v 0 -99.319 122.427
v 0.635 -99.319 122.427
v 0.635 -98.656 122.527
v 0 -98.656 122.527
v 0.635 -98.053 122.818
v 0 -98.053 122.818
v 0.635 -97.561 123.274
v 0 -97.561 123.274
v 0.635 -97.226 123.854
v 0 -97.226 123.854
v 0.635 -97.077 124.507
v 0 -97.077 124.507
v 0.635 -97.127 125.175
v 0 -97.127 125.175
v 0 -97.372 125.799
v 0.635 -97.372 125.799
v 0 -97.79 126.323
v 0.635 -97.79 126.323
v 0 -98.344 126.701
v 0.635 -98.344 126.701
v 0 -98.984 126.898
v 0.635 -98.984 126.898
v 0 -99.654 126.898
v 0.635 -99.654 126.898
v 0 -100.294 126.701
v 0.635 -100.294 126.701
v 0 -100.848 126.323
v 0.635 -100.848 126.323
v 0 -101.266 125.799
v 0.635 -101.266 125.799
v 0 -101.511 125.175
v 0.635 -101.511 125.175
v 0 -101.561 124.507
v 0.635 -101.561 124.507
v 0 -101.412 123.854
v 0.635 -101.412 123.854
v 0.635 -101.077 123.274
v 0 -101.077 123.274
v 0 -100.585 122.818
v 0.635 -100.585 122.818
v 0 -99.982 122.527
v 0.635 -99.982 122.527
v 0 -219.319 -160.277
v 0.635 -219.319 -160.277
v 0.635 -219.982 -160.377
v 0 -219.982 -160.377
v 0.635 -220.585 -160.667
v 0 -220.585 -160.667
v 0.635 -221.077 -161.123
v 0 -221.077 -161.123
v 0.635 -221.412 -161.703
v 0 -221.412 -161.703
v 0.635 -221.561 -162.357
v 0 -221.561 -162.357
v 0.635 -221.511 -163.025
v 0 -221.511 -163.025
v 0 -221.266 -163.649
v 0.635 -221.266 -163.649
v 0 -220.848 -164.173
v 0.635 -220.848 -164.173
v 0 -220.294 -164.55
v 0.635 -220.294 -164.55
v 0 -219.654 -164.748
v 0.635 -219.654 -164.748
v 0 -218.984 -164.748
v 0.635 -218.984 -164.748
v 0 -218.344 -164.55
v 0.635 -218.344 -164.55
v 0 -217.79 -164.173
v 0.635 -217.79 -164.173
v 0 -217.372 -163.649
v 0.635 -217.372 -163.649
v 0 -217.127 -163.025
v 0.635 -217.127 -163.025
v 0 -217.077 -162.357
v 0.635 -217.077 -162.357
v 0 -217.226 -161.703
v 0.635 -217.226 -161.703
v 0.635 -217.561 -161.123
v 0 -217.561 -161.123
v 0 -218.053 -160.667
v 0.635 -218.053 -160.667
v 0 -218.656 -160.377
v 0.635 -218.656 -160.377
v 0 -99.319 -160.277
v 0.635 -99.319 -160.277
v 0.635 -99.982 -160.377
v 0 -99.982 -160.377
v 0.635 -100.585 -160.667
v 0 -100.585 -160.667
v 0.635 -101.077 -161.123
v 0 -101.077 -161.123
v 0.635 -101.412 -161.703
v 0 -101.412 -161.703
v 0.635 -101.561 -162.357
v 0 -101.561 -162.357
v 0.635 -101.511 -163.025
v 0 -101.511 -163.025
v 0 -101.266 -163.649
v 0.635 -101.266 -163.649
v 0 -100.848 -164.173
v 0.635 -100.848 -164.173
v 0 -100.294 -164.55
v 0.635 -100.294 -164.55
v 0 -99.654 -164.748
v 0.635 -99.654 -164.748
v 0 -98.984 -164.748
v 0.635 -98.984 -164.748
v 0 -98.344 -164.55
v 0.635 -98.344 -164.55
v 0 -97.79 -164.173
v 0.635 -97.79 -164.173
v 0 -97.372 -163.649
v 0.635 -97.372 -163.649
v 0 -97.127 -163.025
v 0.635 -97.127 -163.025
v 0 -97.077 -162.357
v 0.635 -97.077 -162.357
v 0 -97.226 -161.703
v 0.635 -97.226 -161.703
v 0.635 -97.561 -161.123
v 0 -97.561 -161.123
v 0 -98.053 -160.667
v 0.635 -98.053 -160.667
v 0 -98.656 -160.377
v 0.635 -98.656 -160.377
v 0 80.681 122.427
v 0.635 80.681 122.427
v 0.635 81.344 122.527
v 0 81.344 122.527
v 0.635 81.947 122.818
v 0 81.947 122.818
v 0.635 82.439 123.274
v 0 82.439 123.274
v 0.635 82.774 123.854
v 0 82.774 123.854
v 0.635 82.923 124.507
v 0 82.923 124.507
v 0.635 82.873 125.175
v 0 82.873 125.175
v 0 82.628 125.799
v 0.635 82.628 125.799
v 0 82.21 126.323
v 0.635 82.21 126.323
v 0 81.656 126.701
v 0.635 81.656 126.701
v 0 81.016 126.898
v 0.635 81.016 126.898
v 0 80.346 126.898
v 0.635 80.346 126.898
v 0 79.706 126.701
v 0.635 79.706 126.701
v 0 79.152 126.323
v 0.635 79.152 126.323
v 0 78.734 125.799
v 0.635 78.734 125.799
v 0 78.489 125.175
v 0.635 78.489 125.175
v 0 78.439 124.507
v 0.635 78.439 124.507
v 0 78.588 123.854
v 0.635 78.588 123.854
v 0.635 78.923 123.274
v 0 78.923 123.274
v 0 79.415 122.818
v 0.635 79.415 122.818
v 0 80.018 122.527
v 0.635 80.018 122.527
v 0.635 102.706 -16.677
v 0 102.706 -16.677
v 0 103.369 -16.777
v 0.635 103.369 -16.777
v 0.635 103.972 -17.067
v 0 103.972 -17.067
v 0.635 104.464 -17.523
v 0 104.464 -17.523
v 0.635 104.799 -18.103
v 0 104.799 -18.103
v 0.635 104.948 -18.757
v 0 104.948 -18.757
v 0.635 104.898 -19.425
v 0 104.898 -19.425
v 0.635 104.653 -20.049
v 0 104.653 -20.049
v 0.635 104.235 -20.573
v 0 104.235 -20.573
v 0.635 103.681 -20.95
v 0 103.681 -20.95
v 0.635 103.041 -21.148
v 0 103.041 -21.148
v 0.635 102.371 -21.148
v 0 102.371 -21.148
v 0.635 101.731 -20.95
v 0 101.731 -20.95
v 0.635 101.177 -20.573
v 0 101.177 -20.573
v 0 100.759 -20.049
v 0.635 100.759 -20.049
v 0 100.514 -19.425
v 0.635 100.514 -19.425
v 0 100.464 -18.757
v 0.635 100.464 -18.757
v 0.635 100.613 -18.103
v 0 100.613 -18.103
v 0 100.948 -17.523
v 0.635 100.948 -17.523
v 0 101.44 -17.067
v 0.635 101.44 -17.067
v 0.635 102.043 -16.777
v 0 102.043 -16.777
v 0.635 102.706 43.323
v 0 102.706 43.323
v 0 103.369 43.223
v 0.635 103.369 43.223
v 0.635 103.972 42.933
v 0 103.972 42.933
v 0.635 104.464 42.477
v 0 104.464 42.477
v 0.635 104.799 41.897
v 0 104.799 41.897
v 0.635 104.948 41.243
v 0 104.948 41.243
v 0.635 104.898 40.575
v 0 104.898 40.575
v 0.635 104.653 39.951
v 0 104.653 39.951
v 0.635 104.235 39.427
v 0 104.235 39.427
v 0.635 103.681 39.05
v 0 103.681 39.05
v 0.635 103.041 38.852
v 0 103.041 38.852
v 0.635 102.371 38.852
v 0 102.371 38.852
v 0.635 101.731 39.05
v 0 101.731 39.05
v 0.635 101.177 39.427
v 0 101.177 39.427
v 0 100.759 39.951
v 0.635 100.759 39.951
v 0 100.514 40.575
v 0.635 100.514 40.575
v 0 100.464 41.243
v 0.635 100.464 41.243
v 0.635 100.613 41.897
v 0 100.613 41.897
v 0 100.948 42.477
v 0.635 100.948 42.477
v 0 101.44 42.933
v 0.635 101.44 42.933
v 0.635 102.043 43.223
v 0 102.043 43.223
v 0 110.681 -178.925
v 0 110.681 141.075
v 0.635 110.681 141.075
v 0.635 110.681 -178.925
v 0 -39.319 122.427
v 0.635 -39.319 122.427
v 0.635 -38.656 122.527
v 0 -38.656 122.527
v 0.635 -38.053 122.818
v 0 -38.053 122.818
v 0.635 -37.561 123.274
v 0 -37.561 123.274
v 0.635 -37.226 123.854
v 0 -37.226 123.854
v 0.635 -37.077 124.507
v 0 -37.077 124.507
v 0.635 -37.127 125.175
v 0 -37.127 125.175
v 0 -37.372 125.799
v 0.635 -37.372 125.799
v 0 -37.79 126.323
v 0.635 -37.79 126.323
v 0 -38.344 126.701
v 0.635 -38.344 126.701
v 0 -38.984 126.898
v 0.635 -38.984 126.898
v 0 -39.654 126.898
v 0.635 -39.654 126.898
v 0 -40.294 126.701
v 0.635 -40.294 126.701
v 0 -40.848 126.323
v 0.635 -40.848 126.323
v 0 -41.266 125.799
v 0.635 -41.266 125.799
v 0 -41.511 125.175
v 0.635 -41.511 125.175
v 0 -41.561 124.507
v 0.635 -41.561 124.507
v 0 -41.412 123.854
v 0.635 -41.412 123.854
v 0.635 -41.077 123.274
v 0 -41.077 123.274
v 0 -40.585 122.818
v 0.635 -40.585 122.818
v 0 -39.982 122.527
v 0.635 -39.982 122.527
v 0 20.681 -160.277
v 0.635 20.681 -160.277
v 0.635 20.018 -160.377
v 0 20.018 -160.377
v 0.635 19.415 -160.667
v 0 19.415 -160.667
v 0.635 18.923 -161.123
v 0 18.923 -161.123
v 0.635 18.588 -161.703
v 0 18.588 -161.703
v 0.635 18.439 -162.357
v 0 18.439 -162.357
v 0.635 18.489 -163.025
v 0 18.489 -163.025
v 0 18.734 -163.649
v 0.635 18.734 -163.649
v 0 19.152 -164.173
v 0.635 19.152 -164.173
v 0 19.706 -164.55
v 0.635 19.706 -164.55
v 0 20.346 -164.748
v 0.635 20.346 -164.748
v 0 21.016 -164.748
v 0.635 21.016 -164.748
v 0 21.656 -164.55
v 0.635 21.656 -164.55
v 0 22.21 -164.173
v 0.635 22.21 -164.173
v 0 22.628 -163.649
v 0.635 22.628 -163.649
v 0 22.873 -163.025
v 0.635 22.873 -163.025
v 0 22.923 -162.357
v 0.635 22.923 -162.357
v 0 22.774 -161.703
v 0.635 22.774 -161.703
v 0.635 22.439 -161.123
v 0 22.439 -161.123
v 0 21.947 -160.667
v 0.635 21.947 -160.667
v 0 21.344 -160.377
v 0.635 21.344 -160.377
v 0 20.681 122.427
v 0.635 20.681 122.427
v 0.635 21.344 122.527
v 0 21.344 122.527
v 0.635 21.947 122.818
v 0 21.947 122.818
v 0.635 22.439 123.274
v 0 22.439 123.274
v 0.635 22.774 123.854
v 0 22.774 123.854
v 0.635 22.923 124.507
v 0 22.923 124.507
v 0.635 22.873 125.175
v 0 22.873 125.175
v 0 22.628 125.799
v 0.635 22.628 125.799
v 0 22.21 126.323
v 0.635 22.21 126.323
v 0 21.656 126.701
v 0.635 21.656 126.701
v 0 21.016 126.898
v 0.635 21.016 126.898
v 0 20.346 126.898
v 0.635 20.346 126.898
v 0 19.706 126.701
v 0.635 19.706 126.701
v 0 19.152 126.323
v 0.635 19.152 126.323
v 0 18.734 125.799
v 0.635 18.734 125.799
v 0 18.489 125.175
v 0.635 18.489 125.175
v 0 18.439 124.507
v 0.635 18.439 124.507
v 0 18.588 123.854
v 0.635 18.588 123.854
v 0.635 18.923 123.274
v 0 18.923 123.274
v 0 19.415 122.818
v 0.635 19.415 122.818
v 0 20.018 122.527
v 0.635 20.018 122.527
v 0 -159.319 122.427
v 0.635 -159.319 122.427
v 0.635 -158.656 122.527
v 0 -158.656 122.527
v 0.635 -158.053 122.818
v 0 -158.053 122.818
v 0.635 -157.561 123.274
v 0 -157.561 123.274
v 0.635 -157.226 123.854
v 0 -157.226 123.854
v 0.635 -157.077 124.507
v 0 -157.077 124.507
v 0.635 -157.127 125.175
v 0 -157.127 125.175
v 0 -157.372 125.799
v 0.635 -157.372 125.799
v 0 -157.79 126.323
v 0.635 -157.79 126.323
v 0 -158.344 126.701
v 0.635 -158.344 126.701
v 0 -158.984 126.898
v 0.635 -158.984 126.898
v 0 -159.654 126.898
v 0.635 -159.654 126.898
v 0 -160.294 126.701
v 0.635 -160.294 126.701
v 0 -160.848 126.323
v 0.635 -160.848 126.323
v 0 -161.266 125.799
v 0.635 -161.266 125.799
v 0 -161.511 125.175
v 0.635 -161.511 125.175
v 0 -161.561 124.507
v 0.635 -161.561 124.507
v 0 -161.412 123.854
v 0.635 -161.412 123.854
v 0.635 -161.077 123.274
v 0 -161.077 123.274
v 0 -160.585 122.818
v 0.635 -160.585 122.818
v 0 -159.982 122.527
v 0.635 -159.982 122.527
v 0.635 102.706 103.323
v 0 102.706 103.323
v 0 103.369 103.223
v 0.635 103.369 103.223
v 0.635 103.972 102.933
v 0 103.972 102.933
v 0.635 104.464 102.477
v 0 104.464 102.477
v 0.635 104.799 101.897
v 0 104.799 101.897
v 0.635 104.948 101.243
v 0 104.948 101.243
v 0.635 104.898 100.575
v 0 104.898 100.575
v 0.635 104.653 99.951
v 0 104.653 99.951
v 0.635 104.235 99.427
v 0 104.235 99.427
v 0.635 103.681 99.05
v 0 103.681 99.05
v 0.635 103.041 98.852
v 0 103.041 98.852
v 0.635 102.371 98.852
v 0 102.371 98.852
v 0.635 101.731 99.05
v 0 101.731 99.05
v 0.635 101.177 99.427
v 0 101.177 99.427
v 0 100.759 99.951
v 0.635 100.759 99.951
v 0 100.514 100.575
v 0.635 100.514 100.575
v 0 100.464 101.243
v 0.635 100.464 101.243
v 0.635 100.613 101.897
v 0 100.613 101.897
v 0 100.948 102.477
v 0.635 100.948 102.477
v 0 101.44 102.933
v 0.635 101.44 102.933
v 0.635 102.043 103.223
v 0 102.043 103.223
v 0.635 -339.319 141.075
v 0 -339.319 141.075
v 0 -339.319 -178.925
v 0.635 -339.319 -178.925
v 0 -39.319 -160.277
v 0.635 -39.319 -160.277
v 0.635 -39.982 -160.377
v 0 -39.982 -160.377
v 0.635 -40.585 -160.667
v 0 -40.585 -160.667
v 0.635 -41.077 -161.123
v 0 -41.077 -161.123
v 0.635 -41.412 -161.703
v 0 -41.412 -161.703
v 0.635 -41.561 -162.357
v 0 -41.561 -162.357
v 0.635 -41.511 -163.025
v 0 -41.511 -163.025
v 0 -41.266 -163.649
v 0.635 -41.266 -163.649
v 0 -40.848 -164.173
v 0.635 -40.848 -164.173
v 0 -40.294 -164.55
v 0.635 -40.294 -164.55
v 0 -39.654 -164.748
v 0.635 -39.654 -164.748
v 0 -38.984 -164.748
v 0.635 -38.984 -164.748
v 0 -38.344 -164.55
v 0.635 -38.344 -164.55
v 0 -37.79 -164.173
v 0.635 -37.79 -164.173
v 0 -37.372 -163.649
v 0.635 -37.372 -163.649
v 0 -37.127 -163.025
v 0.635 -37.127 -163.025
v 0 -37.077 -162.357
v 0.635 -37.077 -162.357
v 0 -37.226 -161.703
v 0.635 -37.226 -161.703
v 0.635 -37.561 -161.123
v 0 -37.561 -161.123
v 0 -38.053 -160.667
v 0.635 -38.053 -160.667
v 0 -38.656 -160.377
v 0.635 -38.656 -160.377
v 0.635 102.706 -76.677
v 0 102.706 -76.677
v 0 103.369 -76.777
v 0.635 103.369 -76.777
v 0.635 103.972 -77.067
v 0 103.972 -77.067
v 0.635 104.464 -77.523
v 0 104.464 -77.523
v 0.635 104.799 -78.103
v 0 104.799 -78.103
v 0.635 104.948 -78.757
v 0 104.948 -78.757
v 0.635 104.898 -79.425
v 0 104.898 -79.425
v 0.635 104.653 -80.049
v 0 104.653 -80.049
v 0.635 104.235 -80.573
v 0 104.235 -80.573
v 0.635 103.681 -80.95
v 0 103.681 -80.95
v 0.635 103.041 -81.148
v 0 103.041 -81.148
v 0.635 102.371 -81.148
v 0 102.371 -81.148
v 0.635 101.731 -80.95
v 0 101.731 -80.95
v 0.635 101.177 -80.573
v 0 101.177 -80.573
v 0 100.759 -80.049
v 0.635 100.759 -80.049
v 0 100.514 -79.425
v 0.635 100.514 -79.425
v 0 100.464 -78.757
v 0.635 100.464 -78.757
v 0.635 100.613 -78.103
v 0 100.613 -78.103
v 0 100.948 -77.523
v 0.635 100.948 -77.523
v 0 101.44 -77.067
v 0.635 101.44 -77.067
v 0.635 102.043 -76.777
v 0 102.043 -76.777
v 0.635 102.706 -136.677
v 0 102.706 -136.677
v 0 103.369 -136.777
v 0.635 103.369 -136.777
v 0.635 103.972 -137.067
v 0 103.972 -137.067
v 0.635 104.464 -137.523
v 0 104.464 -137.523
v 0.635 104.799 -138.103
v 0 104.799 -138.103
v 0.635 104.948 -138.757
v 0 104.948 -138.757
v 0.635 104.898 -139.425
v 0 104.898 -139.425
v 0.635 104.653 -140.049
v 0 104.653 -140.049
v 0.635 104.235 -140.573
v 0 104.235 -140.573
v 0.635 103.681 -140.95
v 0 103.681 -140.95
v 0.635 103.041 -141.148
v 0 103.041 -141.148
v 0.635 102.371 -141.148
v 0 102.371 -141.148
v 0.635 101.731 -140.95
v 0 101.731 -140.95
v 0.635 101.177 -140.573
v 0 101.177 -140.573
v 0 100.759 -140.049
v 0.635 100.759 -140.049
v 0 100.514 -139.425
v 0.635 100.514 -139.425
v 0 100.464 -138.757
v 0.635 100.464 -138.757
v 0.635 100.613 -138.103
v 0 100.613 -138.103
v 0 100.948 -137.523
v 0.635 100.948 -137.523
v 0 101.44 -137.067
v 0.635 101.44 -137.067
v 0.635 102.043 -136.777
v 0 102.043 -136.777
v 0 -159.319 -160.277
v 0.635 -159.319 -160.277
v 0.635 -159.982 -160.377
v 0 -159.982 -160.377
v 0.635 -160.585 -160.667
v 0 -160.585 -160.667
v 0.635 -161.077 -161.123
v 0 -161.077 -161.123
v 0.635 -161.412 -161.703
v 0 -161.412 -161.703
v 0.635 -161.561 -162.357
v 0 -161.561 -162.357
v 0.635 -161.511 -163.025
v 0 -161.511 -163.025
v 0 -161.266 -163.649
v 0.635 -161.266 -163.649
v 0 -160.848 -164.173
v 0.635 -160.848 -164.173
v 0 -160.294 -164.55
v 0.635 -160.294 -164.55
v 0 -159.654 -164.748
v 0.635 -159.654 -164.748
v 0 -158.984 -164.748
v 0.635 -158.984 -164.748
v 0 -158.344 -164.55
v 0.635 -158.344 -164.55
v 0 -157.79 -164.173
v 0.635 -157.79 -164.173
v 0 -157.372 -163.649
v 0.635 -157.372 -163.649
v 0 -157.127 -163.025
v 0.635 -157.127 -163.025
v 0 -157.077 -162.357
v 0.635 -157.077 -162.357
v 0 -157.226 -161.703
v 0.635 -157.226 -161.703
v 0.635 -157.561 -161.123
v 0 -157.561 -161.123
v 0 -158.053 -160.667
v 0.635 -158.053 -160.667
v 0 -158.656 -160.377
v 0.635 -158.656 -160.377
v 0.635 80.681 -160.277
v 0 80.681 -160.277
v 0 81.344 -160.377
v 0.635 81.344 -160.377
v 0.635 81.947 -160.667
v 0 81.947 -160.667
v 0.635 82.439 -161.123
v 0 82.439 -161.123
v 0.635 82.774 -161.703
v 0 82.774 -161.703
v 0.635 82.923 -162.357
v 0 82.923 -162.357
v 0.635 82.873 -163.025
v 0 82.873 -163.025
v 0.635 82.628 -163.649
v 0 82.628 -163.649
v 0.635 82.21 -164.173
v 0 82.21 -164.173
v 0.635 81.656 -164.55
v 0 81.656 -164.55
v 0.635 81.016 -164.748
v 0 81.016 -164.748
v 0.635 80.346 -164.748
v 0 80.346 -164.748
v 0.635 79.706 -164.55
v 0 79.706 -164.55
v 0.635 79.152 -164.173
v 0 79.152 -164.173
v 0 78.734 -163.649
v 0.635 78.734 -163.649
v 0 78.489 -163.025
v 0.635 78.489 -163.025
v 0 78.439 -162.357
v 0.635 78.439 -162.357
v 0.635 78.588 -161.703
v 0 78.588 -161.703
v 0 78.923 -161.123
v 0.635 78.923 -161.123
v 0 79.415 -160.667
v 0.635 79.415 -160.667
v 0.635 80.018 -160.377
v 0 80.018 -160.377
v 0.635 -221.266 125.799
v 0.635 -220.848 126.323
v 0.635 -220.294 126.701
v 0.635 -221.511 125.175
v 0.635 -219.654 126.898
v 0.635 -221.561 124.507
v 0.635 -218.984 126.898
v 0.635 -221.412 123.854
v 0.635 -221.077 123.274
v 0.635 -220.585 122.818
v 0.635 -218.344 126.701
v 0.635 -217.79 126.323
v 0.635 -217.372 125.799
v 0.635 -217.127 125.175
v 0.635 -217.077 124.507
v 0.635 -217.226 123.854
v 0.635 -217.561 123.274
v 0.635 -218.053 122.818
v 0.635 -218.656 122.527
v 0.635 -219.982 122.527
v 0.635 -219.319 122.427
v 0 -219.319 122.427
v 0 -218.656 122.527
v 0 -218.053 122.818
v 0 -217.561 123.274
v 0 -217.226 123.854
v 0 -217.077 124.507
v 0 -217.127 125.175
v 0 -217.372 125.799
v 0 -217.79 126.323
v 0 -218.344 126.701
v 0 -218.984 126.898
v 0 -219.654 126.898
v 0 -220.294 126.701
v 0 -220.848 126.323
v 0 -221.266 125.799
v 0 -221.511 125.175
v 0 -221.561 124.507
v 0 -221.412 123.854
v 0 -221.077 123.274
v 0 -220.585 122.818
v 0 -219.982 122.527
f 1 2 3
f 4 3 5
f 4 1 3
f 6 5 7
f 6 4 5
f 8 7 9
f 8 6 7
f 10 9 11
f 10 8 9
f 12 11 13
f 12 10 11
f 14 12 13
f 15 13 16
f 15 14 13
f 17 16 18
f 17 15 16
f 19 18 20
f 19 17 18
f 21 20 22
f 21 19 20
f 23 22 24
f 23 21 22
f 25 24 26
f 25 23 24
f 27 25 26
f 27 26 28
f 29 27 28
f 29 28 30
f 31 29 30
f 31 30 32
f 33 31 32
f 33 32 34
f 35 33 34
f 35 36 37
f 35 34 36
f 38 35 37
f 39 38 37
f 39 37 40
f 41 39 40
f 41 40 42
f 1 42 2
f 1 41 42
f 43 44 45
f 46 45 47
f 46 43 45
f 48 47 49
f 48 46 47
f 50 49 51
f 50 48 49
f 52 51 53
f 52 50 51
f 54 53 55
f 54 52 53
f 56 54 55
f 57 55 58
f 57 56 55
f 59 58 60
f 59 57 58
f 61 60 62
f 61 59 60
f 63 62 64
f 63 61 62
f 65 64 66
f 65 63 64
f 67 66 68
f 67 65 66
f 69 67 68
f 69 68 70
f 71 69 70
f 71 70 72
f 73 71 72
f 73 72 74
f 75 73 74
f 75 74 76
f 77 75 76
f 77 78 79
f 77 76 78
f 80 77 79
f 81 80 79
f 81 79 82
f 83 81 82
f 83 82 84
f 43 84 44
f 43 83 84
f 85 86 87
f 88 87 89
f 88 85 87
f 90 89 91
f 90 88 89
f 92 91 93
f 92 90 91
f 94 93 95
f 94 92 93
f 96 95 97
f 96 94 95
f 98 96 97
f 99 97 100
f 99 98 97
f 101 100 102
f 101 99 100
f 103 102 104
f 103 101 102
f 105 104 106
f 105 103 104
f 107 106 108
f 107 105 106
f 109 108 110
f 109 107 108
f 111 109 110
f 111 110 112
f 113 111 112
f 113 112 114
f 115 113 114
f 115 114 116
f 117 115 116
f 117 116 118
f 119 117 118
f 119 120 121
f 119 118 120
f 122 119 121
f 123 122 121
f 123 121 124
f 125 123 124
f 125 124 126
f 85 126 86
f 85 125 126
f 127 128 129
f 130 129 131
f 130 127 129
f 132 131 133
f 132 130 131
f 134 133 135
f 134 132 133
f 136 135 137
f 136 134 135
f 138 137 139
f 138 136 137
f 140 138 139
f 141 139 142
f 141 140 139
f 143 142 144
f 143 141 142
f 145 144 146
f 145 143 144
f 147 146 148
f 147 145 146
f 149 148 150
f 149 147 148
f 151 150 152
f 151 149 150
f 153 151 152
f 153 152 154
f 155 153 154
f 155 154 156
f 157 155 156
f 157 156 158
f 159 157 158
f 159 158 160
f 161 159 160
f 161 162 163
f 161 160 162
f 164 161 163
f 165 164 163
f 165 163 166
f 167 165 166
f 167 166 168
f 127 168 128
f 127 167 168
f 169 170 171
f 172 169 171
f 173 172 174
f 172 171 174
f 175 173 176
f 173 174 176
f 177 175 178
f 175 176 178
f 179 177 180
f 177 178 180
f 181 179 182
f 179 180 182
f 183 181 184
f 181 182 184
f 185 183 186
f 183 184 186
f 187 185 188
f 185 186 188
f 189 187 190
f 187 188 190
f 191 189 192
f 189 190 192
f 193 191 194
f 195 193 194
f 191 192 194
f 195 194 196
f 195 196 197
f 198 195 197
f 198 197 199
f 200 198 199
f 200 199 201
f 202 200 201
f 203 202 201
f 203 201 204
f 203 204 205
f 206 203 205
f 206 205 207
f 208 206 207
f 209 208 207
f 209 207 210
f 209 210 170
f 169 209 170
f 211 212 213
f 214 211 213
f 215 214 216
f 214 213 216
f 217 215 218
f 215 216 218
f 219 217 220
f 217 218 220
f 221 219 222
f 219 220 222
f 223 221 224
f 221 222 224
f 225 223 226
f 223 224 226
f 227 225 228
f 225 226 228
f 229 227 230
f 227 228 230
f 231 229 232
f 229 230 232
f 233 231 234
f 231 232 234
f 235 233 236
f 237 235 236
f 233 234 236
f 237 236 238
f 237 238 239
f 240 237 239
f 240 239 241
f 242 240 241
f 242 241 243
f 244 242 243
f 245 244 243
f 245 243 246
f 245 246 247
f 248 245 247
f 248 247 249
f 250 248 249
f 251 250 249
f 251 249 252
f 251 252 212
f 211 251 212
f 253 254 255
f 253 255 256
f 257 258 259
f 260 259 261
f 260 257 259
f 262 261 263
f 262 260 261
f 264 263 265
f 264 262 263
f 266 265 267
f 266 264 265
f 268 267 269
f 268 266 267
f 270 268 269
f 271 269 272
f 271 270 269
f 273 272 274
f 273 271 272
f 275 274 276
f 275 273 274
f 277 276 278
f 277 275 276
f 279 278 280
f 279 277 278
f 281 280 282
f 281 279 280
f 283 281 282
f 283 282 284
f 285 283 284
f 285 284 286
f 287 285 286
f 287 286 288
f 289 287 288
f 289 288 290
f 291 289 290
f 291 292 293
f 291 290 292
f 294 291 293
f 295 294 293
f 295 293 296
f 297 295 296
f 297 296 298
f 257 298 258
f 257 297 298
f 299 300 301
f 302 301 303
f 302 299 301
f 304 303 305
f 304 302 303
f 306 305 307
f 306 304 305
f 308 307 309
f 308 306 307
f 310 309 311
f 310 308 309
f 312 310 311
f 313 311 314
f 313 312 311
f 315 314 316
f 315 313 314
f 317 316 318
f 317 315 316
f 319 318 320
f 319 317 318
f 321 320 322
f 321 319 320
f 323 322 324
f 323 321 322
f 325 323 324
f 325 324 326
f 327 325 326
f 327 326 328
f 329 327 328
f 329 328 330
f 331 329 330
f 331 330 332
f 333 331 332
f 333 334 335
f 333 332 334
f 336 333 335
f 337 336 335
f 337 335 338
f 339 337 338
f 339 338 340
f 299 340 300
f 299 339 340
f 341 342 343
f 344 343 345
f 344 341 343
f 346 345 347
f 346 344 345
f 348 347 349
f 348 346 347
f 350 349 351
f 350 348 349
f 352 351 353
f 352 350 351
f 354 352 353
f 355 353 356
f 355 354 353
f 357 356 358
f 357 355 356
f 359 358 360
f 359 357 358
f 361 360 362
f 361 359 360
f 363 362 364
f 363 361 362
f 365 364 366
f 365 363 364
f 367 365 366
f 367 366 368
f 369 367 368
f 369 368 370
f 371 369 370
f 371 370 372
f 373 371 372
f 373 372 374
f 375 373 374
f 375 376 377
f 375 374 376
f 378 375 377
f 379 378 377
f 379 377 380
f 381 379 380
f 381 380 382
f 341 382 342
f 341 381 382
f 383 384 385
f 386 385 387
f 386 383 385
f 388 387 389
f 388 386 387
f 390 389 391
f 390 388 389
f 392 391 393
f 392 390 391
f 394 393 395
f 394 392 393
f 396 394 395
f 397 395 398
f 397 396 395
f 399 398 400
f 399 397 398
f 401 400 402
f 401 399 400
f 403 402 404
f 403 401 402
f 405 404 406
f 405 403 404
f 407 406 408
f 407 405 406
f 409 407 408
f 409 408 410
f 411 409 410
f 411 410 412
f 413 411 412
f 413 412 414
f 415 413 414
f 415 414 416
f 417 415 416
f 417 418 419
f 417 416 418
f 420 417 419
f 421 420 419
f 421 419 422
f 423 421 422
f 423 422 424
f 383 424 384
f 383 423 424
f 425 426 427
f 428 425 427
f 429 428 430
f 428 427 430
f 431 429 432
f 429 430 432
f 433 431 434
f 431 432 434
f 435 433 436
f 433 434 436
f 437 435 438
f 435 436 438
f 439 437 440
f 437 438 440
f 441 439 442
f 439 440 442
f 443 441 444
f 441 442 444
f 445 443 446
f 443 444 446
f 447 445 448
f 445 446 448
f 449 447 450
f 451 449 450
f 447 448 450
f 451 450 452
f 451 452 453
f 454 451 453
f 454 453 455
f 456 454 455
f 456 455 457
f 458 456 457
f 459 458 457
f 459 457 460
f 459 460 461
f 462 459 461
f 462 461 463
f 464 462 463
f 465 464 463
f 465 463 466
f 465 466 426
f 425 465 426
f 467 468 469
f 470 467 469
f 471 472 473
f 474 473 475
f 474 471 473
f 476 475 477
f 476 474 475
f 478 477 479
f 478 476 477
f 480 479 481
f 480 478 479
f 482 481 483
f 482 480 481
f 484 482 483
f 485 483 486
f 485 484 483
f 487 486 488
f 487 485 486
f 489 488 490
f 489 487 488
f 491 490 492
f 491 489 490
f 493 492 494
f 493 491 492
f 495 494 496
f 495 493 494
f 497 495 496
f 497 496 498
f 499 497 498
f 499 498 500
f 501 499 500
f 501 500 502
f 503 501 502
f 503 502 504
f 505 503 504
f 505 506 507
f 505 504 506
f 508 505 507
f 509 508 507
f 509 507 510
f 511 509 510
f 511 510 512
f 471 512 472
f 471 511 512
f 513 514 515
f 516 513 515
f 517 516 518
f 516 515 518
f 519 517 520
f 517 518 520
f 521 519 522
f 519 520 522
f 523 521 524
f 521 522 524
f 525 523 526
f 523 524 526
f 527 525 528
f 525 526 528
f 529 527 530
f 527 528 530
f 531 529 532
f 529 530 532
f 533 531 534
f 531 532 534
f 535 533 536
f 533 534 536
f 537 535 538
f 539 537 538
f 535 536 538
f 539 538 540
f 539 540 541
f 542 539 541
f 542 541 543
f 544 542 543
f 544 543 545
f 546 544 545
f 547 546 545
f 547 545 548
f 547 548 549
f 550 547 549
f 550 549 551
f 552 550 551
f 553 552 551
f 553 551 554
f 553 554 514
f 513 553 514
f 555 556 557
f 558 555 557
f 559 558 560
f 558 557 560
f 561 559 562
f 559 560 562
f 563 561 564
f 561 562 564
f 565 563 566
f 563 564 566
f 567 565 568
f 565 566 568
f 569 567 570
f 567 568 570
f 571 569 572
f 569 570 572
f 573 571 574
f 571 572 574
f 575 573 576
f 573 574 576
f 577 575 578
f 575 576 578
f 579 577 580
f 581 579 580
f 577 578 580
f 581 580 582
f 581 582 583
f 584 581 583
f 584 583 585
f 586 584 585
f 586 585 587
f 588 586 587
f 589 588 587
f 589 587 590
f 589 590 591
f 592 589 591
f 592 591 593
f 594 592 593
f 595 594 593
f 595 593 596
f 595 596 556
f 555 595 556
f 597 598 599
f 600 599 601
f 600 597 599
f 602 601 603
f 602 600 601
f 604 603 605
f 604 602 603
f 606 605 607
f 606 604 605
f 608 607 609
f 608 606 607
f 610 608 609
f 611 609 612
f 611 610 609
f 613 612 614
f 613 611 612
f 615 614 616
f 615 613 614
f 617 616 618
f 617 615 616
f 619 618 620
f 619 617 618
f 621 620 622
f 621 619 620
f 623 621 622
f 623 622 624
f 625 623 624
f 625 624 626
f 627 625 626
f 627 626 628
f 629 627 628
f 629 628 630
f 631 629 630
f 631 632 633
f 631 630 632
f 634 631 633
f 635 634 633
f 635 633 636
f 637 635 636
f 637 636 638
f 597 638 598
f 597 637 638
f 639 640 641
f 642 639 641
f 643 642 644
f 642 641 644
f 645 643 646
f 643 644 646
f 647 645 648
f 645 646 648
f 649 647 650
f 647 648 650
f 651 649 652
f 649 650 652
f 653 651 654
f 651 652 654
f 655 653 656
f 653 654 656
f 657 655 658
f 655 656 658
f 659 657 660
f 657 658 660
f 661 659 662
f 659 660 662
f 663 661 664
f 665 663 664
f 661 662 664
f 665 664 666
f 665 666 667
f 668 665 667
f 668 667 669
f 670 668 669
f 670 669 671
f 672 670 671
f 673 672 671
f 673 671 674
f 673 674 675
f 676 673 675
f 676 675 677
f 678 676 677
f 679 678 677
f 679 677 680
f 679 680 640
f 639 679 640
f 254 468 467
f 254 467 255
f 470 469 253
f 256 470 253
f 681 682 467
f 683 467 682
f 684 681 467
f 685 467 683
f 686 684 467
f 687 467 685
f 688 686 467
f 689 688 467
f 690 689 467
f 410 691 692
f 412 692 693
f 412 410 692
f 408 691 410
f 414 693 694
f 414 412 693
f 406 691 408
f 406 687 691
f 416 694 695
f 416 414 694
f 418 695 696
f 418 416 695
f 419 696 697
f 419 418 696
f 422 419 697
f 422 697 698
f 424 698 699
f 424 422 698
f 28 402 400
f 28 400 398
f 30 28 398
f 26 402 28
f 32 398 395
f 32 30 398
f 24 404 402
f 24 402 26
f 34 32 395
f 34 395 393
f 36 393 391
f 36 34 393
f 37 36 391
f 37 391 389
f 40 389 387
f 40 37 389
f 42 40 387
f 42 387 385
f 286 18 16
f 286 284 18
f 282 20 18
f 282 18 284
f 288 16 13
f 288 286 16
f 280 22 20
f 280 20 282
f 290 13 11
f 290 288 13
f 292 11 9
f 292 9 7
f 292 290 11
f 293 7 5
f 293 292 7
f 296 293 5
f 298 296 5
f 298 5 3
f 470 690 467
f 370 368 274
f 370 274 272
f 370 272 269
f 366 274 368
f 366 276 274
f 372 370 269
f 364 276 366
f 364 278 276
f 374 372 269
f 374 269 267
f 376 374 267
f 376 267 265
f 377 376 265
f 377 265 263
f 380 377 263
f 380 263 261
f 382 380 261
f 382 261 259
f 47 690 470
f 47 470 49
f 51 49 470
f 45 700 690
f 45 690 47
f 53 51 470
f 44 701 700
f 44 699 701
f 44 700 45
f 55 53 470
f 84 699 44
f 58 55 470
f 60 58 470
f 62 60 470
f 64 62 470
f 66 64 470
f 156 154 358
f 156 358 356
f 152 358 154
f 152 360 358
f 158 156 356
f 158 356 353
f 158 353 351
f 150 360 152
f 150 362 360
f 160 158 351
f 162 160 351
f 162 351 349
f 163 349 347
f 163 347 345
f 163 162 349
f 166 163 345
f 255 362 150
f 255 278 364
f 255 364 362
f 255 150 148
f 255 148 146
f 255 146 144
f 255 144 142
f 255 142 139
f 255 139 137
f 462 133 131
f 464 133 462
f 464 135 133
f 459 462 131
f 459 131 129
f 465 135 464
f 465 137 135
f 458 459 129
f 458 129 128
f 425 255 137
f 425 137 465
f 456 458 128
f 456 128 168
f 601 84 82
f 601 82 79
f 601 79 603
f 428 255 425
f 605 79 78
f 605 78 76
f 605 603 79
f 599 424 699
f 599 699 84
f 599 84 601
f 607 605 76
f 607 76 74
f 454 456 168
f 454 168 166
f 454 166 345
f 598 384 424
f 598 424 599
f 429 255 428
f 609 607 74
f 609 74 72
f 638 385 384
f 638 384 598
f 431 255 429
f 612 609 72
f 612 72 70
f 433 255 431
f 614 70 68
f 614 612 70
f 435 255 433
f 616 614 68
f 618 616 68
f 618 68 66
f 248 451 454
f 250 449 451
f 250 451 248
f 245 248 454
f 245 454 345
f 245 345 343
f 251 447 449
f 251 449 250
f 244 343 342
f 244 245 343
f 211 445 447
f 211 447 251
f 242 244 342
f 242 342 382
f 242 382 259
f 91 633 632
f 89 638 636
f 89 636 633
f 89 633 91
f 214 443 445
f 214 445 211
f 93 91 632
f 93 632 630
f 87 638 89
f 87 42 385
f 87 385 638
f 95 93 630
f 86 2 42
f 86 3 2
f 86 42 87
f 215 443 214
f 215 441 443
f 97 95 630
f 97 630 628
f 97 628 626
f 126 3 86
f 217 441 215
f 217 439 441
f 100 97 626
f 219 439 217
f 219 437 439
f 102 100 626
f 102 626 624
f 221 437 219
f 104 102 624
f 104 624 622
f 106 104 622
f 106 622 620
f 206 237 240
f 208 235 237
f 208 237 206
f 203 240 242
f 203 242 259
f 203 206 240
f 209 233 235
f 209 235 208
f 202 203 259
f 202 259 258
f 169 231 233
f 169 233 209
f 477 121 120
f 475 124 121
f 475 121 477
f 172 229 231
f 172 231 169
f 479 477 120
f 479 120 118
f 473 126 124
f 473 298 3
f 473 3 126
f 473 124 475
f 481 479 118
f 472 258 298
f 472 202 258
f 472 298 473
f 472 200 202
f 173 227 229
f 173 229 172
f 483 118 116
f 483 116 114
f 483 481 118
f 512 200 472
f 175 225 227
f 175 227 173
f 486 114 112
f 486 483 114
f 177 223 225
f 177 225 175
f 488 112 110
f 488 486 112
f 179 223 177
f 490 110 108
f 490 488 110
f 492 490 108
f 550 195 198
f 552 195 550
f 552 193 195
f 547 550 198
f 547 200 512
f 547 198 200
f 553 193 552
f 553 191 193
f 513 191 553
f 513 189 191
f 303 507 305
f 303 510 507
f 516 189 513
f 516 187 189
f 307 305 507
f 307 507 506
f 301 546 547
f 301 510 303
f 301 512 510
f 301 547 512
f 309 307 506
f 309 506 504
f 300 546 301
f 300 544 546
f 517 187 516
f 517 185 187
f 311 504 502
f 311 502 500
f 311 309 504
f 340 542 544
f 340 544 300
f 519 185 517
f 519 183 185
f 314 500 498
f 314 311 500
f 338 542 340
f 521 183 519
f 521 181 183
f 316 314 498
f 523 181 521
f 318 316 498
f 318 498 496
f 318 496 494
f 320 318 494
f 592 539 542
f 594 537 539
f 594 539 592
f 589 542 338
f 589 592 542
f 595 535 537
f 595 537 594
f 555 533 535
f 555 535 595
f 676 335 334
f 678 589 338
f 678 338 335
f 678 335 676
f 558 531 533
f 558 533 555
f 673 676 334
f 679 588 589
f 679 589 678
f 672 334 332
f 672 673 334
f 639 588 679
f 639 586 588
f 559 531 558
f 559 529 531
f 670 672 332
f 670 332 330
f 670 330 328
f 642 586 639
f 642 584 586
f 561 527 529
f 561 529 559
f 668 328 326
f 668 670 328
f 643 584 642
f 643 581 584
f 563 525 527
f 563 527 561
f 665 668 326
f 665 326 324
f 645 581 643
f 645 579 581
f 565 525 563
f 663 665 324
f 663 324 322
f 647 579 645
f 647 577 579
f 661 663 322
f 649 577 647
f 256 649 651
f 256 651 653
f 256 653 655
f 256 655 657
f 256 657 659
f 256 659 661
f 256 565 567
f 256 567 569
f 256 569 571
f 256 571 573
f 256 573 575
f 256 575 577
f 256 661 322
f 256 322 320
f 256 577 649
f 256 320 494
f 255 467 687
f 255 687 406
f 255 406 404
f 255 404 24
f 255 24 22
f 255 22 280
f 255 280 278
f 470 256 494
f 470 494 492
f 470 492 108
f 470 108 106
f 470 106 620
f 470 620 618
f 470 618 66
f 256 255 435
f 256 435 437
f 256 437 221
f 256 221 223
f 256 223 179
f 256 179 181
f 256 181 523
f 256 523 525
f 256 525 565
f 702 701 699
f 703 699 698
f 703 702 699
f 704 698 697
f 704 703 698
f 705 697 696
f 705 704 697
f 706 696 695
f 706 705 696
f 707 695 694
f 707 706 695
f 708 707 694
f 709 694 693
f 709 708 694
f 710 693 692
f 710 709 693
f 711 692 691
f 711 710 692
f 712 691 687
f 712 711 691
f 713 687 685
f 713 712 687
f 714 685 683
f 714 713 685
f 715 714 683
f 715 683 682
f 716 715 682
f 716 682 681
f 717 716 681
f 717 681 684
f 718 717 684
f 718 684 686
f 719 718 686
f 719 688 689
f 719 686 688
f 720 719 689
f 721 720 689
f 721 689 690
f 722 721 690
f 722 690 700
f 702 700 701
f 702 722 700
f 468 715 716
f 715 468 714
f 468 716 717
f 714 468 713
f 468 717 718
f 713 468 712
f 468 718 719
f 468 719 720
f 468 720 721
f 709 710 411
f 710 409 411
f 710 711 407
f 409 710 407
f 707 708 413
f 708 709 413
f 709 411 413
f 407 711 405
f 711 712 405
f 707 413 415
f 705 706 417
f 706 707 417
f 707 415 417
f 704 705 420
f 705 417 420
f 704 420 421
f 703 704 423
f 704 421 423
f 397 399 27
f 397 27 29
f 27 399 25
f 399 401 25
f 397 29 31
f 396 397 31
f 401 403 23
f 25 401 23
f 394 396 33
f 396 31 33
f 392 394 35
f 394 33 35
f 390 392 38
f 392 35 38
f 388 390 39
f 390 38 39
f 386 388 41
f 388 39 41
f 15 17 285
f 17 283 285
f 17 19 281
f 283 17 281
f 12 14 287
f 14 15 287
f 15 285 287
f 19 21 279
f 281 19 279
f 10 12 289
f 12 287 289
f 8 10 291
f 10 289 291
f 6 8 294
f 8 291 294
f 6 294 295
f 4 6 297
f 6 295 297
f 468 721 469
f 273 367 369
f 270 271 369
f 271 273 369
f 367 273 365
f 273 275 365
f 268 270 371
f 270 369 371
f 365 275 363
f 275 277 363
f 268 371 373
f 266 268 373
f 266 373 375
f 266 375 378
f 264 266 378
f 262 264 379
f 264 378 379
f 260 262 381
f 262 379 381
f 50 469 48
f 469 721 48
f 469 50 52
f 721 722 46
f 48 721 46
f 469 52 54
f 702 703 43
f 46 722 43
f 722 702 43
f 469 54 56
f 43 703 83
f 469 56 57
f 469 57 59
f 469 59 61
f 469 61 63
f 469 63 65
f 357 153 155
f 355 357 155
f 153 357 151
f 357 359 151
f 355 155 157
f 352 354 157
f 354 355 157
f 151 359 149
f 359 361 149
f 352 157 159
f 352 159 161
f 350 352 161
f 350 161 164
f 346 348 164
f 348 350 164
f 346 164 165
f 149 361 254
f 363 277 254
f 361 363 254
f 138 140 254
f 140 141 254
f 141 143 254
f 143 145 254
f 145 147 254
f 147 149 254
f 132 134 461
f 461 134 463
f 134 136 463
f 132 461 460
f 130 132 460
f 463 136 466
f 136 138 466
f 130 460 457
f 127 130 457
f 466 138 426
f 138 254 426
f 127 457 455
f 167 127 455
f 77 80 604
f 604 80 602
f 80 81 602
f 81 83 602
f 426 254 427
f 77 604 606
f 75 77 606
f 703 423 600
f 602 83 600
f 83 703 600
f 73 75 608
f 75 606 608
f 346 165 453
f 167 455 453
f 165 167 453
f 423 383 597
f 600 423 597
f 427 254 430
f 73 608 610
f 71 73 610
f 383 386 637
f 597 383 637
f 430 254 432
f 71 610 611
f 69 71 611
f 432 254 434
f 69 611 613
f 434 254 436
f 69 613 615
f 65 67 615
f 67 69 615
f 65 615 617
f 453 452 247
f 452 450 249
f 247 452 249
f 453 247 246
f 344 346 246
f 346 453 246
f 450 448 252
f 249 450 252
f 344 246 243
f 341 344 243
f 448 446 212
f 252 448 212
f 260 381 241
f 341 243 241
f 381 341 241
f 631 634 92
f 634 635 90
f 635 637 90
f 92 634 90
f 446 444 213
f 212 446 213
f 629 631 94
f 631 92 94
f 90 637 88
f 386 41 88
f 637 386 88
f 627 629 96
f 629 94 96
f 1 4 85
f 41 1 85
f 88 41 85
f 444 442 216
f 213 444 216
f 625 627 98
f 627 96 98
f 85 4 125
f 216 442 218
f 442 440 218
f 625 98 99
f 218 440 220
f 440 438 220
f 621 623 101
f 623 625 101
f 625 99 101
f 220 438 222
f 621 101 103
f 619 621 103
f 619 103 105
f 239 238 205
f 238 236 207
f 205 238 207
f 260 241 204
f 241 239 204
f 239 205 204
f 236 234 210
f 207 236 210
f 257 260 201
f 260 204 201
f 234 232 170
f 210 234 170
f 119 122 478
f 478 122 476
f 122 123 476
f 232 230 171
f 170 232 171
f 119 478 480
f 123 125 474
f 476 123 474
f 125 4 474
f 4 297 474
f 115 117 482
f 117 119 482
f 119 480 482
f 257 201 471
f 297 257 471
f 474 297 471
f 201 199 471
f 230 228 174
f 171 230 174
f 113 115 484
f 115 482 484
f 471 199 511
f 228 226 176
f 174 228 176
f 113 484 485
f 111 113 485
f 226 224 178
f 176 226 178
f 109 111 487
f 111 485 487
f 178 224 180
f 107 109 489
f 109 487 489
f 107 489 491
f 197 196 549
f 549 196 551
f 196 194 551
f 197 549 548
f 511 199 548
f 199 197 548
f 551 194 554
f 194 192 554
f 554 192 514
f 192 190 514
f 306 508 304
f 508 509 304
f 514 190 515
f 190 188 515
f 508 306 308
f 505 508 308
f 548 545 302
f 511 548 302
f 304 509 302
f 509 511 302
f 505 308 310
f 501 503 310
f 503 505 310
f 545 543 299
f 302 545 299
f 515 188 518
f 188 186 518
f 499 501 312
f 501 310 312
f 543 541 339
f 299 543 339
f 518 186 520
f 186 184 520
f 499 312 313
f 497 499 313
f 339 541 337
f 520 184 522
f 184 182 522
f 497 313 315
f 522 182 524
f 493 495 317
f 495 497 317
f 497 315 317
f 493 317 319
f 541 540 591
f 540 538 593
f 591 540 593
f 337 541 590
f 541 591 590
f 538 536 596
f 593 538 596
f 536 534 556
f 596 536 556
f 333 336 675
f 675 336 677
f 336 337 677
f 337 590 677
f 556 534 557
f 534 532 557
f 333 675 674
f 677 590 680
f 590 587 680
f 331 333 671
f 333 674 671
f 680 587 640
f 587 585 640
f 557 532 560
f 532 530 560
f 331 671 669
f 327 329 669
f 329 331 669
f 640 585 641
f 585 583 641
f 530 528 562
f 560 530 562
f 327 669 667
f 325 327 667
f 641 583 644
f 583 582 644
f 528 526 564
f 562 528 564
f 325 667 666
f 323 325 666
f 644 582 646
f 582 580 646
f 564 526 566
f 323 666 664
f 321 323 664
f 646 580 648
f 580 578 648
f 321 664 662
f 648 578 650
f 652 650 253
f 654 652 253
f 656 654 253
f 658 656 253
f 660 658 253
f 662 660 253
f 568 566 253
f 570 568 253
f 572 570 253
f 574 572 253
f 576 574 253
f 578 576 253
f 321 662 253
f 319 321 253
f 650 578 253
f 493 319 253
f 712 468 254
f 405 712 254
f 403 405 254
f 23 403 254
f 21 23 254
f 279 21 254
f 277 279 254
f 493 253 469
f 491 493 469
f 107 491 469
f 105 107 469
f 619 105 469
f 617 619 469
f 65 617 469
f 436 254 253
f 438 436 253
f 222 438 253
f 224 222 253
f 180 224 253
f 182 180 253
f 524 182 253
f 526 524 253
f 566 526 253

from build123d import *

# Parameters (mm, degrees)
SKETCH1_W               = 320
SKETCH1_H               = 450
BOSS_EXTRUDE1_DEPTH     = 0.635
SKETCH2_R               = 2.248
CUT_EXTRUDE1_DEPTH      = 384.603759083
LPATTERN1_COUNT         = 6
LPATTERN1_PITCH         = 60
MIRROR2_COPY_1_SKETCH_R = 2.248
MIRROR2_COPY_1_DEPTH    = 384.603759083
MIRROR2_COPY_2_SKETCH_R = 2.248
MIRROR2_COPY_2_DEPTH    = 384.603759083
MIRROR2_COPY_3_SKETCH_R = 2.248
MIRROR2_COPY_3_DEPTH    = 384.603759083
MIRROR2_COPY_4_SKETCH_R = 2.248
MIRROR2_COPY_4_DEPTH    = 384.603759083
MIRROR2_COPY_5_SKETCH_R = 2.248
MIRROR2_COPY_5_DEPTH    = 384.603759083
MIRROR2_COPY_6_SKETCH_R = 2.248
MIRROR2_COPY_6_DEPTH    = 384.603759083
SKETCH3_R               = 2.248
CUT_EXTRUDE2_DEPTH      = 384.603759083
LPATTERN2_COUNT         = 5
LPATTERN2_PITCH         = 60


with BuildPart() as part:
    # Sketch1 → Boss-Extrude1 (new body)
    with BuildSketch(Plane(origin=(0, 0, 0), x_dir=(0, 0, -1), z_dir=(1, 0, 0))):
        with Locations((18.924731183, -114.318996416)):
            Rectangle(SKETCH1_W, SKETCH1_H)
    extrude(amount=BOSS_EXTRUDE1_DEPTH)

    # Sketch2 → Cut-Extrude1 (cut, through all)
    with BuildSketch(Plane(origin=(0, 0, 0), x_dir=(0, 0, -1), z_dir=(1, 0, 0))):
        with Locations((-124.675268817, 80.681003584)):
            Circle(SKETCH2_R)
    cut_extrude1 = extrude(amount=CUT_EXTRUDE1_DEPTH, mode=Mode.SUBTRACT)

    # LPattern1: Cut-Extrude1 ×6
    with Locations(*[(0, -i * LPATTERN1_PITCH, 0) for i in range(1, LPATTERN1_COUNT)]):
        add(cut_extrude1, mode=Mode.SUBTRACT)

    # Mirror2 copy 1 sketch → Mirror2 copy 1 (cut, through all)
    with BuildSketch(Plane(origin=(0, -60, -37.849462366), x_dir=(0, 0, 1), z_dir=(1, 0, 0))):
        with Locations((-124.675268817, -80.681003584)):
            Circle(MIRROR2_COPY_1_SKETCH_R)
    extrude(amount=MIRROR2_COPY_1_DEPTH, mode=Mode.SUBTRACT)

    # Mirror2 copy 2 sketch → Mirror2 copy 2 (cut, through all)
    with BuildSketch(Plane(origin=(0, -120, -37.849462366), x_dir=(0, 0, 1), z_dir=(1, 0, 0))):
        with Locations((-124.675268817, -80.681003584)):
            Circle(MIRROR2_COPY_2_SKETCH_R)
    extrude(amount=MIRROR2_COPY_2_DEPTH, mode=Mode.SUBTRACT)

    # Mirror2 copy 3 sketch → Mirror2 copy 3 (cut, through all)
    with BuildSketch(Plane(origin=(0, -180, -37.849462366), x_dir=(0, 0, 1), z_dir=(1, 0, 0))):
        with Locations((-124.675268817, -80.681003584)):
            Circle(MIRROR2_COPY_3_SKETCH_R)
    extrude(amount=MIRROR2_COPY_3_DEPTH, mode=Mode.SUBTRACT)

    # Mirror2 copy 4 sketch → Mirror2 copy 4 (cut, through all)
    with BuildSketch(Plane(origin=(0, -240, -37.849462366), x_dir=(0, 0, 1), z_dir=(1, 0, 0))):
        with Locations((-124.675268817, -80.681003584)):
            Circle(MIRROR2_COPY_4_SKETCH_R)
    extrude(amount=MIRROR2_COPY_4_DEPTH, mode=Mode.SUBTRACT)

    # Mirror2 copy 5 sketch → Mirror2 copy 5 (cut, through all)
    with BuildSketch(Plane(origin=(0, -300, -37.849462366), x_dir=(0, 0, 1), z_dir=(1, 0, 0))):
        with Locations((-124.675268817, -80.681003584)):
            Circle(MIRROR2_COPY_5_SKETCH_R)
    extrude(amount=MIRROR2_COPY_5_DEPTH, mode=Mode.SUBTRACT)

    # Mirror2 copy 6 sketch → Mirror2 copy 6 (cut, through all)
    with BuildSketch(Plane(origin=(0, 0, -37.849462366), x_dir=(0, 0, 1), z_dir=(1, 0, 0))):
        with Locations((-124.675268817, -80.681003584)):
            Circle(MIRROR2_COPY_6_SKETCH_R)
    extrude(amount=MIRROR2_COPY_6_DEPTH, mode=Mode.SUBTRACT)

    # Sketch3 → Cut-Extrude2 (cut, through all)
    with BuildSketch(Plane.ZY):
        with Locations((-138.924731183, 102.706003584)):
            Circle(SKETCH3_R)
    cut_extrude2 = extrude(amount=-CUT_EXTRUDE2_DEPTH, mode=Mode.SUBTRACT)

    # LPattern2: Cut-Extrude2 ×5
    with Locations(*[(0, 0, i * LPATTERN2_PITCH) for i in range(1, LPATTERN2_COUNT)]):
        add(cut_extrude2, mode=Mode.SUBTRACT)


solid = part.part
